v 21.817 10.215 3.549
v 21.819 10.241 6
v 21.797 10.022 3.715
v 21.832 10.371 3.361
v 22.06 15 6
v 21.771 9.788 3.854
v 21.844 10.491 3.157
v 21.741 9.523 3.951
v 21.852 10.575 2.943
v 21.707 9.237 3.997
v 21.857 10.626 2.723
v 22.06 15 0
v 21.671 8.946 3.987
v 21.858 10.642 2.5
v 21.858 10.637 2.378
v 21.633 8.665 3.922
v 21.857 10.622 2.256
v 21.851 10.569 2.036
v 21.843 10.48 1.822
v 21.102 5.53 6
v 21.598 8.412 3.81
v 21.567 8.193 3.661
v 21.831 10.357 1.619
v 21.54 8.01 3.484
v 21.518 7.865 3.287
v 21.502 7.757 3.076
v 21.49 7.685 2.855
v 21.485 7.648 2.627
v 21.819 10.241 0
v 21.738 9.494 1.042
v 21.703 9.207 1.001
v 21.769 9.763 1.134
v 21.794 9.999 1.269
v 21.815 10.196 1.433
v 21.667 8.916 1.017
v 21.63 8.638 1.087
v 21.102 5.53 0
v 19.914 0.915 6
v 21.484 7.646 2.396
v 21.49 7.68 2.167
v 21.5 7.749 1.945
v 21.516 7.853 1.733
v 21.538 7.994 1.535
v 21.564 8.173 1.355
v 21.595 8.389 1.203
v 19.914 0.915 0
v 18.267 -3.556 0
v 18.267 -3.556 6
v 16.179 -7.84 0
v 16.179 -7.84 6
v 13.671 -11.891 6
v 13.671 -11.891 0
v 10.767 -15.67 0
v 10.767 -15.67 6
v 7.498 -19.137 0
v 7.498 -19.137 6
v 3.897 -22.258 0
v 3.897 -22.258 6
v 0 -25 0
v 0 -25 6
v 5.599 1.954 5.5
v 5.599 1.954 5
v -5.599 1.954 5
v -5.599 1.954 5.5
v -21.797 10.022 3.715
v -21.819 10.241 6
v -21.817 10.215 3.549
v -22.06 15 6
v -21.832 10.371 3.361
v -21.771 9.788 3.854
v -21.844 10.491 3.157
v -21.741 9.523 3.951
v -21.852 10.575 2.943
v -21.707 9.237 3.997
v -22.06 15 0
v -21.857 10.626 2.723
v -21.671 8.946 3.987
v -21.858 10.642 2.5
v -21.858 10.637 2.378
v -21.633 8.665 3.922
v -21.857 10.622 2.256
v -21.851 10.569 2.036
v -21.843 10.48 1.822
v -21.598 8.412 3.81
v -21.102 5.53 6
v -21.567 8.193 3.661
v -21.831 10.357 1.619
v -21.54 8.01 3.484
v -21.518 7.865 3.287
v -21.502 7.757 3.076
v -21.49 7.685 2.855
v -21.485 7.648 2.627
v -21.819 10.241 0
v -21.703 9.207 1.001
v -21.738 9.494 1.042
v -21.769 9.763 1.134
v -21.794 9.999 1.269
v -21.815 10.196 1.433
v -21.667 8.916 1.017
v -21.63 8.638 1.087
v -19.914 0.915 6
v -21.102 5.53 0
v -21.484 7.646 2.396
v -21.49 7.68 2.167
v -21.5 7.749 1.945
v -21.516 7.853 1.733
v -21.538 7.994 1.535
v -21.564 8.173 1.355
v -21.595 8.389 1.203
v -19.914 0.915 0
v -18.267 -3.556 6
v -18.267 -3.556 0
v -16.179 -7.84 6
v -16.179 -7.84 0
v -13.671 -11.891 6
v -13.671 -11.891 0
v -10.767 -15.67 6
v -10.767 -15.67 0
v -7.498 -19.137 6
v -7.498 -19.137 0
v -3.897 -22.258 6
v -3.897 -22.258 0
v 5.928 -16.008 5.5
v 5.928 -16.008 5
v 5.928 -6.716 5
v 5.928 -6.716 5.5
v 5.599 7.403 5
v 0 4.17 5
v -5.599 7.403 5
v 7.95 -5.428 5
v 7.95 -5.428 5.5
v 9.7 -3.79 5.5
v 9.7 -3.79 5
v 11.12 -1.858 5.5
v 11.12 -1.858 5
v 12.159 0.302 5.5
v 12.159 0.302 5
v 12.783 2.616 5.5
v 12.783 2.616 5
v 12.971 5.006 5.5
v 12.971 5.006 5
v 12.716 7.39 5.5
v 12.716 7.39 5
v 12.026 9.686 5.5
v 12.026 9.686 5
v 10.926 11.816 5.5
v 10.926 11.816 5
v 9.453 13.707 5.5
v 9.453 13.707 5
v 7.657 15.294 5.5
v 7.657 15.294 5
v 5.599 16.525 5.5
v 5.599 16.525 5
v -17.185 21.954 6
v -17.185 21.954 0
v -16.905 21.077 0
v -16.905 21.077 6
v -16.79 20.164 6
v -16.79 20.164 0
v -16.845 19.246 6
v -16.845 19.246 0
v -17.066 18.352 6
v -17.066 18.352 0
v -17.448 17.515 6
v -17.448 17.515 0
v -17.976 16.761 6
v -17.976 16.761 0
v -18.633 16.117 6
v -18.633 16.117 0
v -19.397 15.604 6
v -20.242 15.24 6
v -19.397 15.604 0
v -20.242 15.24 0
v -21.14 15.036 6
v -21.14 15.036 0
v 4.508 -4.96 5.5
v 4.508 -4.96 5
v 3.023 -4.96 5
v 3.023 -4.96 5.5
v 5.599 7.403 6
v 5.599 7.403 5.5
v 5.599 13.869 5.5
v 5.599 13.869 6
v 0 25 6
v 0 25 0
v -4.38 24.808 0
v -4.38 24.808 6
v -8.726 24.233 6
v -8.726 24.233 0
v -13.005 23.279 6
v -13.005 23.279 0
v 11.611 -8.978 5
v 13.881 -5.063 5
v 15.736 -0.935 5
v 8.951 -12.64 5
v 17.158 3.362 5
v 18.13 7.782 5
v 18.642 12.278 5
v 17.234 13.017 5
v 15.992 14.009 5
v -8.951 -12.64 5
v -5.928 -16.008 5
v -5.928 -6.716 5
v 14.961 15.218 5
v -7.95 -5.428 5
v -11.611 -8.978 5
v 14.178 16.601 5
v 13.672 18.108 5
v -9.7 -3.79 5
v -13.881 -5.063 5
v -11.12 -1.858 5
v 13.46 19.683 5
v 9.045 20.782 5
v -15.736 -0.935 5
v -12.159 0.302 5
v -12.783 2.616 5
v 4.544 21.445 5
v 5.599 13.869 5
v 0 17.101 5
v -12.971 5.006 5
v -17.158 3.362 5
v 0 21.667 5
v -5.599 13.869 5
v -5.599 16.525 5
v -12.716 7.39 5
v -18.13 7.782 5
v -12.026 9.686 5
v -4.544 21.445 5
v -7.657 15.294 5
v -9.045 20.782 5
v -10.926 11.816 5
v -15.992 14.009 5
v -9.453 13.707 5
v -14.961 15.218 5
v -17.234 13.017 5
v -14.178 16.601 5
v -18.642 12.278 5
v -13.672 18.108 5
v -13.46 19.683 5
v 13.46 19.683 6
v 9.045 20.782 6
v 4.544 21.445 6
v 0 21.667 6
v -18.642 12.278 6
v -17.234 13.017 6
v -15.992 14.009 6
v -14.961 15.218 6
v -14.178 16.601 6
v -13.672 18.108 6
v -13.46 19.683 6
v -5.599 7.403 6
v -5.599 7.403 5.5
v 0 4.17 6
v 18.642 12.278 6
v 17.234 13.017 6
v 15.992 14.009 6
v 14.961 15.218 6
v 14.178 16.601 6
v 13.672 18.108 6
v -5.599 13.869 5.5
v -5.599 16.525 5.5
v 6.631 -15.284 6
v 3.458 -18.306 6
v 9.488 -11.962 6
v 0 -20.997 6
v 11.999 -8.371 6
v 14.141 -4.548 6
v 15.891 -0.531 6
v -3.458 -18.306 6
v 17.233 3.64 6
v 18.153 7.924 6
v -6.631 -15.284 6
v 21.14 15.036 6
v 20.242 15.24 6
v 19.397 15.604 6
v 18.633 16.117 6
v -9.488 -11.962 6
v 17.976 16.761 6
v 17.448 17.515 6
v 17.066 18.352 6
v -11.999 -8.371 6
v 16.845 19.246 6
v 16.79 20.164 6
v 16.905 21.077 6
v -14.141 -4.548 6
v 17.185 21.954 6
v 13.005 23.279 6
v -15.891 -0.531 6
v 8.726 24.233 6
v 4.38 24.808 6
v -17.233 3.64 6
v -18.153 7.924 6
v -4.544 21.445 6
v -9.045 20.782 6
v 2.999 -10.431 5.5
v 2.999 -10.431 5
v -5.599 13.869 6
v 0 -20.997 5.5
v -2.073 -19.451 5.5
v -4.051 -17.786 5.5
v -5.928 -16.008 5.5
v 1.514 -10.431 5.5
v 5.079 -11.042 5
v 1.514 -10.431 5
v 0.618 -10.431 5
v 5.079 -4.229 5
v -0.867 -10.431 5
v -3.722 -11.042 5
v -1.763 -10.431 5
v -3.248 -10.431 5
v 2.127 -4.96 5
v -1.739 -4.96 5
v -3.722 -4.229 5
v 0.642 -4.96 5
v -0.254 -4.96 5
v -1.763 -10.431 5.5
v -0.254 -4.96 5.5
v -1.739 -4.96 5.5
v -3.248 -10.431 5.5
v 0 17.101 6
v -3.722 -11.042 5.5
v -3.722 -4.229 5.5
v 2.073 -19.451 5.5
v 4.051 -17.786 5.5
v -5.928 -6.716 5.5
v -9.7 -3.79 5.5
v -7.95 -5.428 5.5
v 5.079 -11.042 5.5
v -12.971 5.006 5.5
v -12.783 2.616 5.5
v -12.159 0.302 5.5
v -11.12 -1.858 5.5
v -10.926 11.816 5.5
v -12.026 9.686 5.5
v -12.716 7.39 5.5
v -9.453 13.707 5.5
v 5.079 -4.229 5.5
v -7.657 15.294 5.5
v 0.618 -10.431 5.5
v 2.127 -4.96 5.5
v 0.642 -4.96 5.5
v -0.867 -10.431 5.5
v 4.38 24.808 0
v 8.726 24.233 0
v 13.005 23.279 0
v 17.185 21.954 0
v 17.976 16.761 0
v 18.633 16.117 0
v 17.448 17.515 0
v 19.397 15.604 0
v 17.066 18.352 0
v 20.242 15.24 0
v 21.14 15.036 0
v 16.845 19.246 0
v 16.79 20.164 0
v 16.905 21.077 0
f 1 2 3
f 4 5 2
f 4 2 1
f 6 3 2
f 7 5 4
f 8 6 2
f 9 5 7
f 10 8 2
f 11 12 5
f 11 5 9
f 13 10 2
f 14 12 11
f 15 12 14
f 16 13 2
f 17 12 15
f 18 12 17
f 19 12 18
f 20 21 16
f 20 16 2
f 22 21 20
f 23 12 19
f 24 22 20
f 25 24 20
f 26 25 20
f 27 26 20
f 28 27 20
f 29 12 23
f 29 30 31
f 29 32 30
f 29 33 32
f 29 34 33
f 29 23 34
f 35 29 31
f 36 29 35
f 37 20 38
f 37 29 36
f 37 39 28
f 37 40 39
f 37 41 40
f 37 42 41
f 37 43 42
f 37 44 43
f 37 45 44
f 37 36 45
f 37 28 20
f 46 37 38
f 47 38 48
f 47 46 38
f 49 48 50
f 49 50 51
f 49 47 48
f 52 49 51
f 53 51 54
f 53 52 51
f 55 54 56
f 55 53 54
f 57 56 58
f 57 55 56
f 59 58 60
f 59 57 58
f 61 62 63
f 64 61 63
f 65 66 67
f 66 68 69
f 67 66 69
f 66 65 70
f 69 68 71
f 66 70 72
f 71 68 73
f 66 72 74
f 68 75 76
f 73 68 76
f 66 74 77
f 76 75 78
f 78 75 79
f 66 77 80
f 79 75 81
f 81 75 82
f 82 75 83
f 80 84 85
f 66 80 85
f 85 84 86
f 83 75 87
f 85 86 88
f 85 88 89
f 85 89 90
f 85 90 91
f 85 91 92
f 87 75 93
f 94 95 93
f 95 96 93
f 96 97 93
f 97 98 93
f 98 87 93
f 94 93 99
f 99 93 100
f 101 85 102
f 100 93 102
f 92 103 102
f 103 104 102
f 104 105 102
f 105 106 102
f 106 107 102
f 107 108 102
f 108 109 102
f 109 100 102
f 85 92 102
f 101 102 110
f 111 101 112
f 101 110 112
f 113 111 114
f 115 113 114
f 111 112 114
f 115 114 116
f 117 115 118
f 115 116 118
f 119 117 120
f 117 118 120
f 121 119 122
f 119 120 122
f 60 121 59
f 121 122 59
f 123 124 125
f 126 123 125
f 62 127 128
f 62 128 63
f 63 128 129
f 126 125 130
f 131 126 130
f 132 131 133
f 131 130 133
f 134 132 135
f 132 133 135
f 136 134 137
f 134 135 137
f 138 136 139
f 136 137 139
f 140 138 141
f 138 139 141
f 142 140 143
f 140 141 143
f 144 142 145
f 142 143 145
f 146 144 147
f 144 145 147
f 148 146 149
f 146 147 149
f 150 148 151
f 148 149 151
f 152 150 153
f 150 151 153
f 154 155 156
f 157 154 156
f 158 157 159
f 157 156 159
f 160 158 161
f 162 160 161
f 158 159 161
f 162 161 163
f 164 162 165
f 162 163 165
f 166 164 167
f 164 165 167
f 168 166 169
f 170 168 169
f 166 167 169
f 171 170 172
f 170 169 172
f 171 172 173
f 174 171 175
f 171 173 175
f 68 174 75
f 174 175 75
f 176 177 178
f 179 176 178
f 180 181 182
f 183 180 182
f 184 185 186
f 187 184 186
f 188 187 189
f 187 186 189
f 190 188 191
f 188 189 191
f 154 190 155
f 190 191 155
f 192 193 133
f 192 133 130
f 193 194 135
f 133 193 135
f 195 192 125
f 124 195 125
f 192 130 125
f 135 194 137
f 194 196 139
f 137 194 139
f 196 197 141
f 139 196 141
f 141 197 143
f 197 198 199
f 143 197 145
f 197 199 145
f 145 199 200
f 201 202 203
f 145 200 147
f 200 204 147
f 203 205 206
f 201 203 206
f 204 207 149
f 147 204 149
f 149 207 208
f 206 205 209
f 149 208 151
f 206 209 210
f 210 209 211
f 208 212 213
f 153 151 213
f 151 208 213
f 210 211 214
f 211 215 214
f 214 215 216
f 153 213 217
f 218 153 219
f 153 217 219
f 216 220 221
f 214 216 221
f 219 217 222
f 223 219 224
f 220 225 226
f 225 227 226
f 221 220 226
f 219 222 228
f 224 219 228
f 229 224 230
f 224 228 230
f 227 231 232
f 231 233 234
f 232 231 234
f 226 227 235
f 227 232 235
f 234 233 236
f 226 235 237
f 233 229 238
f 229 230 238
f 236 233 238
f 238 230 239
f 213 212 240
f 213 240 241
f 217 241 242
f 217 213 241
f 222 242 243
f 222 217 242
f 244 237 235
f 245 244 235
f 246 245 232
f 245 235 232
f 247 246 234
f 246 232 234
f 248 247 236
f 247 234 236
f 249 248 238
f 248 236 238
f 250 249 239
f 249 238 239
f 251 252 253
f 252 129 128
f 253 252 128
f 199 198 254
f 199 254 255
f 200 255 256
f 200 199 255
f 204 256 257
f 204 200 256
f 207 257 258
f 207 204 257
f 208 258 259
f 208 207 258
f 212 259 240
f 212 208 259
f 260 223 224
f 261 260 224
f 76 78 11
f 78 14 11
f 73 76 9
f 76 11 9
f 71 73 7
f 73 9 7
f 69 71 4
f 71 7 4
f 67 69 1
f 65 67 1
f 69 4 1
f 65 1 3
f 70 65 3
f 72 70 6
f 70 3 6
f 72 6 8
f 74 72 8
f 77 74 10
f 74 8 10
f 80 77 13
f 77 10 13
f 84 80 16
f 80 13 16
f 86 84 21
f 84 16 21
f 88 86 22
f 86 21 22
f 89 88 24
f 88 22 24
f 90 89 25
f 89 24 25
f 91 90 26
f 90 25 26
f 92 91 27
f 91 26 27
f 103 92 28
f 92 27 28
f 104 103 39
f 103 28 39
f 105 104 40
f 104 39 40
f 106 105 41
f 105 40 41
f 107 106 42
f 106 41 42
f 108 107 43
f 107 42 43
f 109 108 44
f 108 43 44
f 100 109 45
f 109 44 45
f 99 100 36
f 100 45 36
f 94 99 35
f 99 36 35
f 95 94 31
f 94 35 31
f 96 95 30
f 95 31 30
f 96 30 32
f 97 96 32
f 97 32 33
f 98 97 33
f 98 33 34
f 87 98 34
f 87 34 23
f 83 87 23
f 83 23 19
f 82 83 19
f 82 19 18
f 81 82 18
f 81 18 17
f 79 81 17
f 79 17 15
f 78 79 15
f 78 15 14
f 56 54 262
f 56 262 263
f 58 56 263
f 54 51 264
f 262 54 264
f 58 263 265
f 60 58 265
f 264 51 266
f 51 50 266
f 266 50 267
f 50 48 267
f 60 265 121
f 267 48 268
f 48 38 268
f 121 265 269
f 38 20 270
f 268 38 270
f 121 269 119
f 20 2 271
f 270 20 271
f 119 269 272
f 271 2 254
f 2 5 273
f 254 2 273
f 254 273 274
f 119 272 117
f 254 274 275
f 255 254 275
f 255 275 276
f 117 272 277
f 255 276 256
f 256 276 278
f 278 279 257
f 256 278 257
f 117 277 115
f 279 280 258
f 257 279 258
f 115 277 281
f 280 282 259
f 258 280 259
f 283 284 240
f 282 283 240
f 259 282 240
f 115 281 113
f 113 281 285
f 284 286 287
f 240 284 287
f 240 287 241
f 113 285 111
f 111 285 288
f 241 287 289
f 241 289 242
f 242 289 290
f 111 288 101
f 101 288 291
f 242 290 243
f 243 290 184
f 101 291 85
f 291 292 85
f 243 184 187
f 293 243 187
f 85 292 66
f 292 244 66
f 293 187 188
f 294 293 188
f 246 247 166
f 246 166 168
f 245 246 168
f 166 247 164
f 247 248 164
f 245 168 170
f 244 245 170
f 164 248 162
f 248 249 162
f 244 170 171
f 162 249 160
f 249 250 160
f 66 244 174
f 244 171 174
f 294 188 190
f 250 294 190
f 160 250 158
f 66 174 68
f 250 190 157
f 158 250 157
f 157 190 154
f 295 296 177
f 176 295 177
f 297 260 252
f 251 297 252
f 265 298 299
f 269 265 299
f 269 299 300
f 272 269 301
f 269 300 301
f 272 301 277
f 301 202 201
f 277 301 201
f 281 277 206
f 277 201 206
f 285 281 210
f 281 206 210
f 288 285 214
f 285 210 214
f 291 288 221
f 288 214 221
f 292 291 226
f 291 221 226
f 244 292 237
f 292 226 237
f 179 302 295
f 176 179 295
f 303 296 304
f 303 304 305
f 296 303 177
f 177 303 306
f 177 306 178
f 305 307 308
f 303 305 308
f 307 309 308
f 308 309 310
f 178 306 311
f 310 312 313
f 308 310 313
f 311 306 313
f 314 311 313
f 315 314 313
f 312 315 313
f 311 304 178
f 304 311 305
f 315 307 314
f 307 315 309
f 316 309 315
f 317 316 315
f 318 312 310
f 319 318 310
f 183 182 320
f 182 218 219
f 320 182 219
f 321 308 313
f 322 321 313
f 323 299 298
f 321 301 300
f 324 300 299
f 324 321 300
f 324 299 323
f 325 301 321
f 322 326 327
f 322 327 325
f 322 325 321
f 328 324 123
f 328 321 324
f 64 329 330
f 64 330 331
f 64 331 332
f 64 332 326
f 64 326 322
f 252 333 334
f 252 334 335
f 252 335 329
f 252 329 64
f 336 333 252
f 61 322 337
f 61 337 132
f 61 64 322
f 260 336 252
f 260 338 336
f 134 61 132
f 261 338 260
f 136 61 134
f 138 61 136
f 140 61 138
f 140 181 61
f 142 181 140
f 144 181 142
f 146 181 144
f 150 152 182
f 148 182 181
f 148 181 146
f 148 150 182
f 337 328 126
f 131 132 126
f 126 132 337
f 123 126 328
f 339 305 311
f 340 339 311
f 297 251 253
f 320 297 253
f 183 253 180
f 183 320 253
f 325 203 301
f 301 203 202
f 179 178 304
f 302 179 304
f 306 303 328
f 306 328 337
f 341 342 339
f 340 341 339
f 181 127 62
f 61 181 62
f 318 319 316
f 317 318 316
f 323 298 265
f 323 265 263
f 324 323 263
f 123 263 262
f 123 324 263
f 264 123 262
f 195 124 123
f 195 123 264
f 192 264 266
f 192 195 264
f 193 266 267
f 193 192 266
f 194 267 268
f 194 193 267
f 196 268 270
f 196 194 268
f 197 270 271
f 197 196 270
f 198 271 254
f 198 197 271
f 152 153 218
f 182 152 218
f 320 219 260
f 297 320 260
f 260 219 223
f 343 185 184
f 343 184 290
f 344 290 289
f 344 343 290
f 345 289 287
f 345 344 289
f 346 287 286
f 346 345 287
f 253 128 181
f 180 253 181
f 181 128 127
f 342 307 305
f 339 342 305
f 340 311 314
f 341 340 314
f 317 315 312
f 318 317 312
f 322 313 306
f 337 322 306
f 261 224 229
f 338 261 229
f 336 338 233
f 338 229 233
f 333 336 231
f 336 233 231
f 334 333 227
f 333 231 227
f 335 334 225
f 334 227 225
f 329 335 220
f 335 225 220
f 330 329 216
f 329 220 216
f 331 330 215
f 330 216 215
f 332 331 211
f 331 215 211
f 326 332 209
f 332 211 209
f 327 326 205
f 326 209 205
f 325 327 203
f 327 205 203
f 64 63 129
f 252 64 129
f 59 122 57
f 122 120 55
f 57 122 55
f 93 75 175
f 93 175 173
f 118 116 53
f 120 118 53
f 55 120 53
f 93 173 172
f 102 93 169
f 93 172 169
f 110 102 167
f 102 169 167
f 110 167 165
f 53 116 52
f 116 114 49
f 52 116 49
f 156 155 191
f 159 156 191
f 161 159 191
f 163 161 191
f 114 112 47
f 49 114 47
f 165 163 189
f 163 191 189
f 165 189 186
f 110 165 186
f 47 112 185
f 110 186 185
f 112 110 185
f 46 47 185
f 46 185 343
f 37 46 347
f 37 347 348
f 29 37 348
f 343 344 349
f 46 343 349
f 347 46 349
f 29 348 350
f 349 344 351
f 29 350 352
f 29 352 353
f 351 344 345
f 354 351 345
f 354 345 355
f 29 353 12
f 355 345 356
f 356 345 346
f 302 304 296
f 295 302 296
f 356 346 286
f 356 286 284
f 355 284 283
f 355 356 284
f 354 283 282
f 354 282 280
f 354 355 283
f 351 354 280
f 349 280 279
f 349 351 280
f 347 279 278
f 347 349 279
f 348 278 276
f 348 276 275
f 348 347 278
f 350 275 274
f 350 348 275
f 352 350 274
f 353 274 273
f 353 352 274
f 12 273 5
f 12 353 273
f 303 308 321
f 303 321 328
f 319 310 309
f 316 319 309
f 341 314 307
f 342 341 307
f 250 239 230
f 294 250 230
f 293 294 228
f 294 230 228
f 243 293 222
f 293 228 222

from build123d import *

# Parameters (mm, degrees)
F3_DEPTH       = 6
F4_DEPTH       = 5
F7_W           = 8.8009524625
F7_H           = 6.8124858662
F8_DEPTH       = 5.5
F9_DEPTH       = 6
F10_R          = 1.5
F11_DEPTH      = 22.0605344206
F11_DEPTH_BACK = 22.0605344206


with BuildPart() as f3:
    # F2 (on Top) → F3 (new body)
    with BuildSketch(Plane.XY):
        with BuildLine():
            Line((0, 21.6666666667), (0, 25))
            ThreePointArc((0, 25), (-8.7261968456, 24.2326465733), (-17.1845506091, 21.9541395445))
            ThreePointArc((-17.1845506091, 21.9541395445), (-17.6945480382, 17.1258595599), (-22.0595344206, 15))
            ThreePointArc((-22.0595344206, 15), (-16.1790775021, -7.8397846906), (0, -25))
            Line((0, -25), (0, -20.9973518952))
            ThreePointArc((0, -20.9973518952), (-13.1176654632, -6.4864713134), (-18.6418781092, 12.2784394807))
            ThreePointArc((-18.6418781092, 12.2784394807), (-14.9610674668, 15.2181844096), (-13.460154741, 19.6833527404))
            ThreePointArc((-13.460154741, 19.6833527404), (-6.8027439277, 21.1681757581), (0, 21.6666666667))
        make_face()
    extrude(amount=F3_DEPTH)

    # F2 (on Top) → F4 (join)
    with BuildSketch(Plane.XY):
        with BuildLine():
            Line((0, -20.9973518952), (0, 21.6666666667))
            ThreePointArc((0, 21.6666666667), (-6.8027439277, 21.1681757581), (-13.460154741, 19.6833527404))
            ThreePointArc((-13.460154741, 19.6833527404), (-14.9610674668, 15.2181844096), (-18.6418781092, 12.2784394807))
            ThreePointArc((-18.6418781092, 12.2784394807), (-13.1176654632, -6.4864713134), (0, -20.9973518952))
        make_face()
    extrude(amount=F4_DEPTH)

    # F5: F3 across plane


with BuildPart() as f3_1:
    add(f3.part)
    add(f3.part.mirror(Plane.YZ))

    # F7 (on Top) → F8 (join)
    with BuildSketch(Plane.XY):
        with BuildLine():
            Line((5.5992295966, 16.5245700628), (5.5992295966, 13.8685129642))
            Line((5.5992295966, 13.8685129642), (5.5992295966, 7.4030795346))
            Line((5.5992295966, 7.4030795346), (5.5992295966, 1.9538915054))
            Line((5.5992295966, 1.9538915054), (-5.5992295966, 1.9538915054))
            Line((-5.5992295966, 1.9538915054), (-5.5992295966, 7.4030795346))
            Line((-5.5992295966, 7.4030795346), (-5.5992295966, 13.8685129642))
            Line((-5.5992295966, 13.8685129642), (-5.5992295966, 16.5245700628))
            ThreePointArc((-5.5992295966, 16.5245700628), (-12.9710057836, 5.0063042214), (-5.9278514236, -6.7157906769))
            Line((-5.9278514236, -6.7157906769), (-5.9278514236, -19.3214993029))
            Line((-5.9278514236, -19.3214993029), (0, -23.4193839133))
            Line((0, -23.4193839133), (5.9278514236, -20.1235420135))
            Line((5.9278514236, -20.1235420135), (5.9278514236, -6.7157906769))
            ThreePointArc((5.9278514236, -6.7157906769), (12.9710057836, 5.0063042214), (5.5992295966, 16.5245700628))
        make_face()
        with Locations((0.6785687292, -7.6357298531)):
            Rectangle(F7_W, F7_H, mode=Mode.SUBTRACT)
        Polygon((-1.7386174295, -4.9604633823), (-3.247810062, -10.4308445007), (-1.7631669762, -10.4308445007), (-0.2539743437, -4.9604633823), align=None)
        Polygon((0.6177854048, -10.4308445007), (2.1269780373, -4.9604633823), (0.6423349514, -4.9604633823), (-0.8668576811, -10.4308445007), align=None)
        Polygon((2.9987377857, -10.4308445007), (4.5079304183, -4.9604633823), (3.0232873324, -4.9604633823), (1.5140946999, -10.4308445007), align=None)
    extrude(amount=F8_DEPTH)

    # F7 (on Top) → F9 (join)
    with BuildSketch(Plane.XY):
        Polygon((5.5992295966, 7.4030795346), (5.5992295966, 13.8685129642), (0, 17.1012296791), (-5.5992295966, 13.8685129642), (-5.5992295966, 7.4030795346), (0, 4.1703628198), align=None)
    extrude(amount=F9_DEPTH)

    # F10 (on Right) → F11 (cut, two sides)
    with BuildSketch(Plane.YZ) as f11_sk:
        with Locations((9.1423522681, 2.5)):
            Circle(F10_R)
    extrude(amount=-F11_DEPTH, mode=Mode.SUBTRACT)
    extrude(f11_sk.sketch, amount=F11_DEPTH_BACK, mode=Mode.SUBTRACT)


solid = f3_1.part
